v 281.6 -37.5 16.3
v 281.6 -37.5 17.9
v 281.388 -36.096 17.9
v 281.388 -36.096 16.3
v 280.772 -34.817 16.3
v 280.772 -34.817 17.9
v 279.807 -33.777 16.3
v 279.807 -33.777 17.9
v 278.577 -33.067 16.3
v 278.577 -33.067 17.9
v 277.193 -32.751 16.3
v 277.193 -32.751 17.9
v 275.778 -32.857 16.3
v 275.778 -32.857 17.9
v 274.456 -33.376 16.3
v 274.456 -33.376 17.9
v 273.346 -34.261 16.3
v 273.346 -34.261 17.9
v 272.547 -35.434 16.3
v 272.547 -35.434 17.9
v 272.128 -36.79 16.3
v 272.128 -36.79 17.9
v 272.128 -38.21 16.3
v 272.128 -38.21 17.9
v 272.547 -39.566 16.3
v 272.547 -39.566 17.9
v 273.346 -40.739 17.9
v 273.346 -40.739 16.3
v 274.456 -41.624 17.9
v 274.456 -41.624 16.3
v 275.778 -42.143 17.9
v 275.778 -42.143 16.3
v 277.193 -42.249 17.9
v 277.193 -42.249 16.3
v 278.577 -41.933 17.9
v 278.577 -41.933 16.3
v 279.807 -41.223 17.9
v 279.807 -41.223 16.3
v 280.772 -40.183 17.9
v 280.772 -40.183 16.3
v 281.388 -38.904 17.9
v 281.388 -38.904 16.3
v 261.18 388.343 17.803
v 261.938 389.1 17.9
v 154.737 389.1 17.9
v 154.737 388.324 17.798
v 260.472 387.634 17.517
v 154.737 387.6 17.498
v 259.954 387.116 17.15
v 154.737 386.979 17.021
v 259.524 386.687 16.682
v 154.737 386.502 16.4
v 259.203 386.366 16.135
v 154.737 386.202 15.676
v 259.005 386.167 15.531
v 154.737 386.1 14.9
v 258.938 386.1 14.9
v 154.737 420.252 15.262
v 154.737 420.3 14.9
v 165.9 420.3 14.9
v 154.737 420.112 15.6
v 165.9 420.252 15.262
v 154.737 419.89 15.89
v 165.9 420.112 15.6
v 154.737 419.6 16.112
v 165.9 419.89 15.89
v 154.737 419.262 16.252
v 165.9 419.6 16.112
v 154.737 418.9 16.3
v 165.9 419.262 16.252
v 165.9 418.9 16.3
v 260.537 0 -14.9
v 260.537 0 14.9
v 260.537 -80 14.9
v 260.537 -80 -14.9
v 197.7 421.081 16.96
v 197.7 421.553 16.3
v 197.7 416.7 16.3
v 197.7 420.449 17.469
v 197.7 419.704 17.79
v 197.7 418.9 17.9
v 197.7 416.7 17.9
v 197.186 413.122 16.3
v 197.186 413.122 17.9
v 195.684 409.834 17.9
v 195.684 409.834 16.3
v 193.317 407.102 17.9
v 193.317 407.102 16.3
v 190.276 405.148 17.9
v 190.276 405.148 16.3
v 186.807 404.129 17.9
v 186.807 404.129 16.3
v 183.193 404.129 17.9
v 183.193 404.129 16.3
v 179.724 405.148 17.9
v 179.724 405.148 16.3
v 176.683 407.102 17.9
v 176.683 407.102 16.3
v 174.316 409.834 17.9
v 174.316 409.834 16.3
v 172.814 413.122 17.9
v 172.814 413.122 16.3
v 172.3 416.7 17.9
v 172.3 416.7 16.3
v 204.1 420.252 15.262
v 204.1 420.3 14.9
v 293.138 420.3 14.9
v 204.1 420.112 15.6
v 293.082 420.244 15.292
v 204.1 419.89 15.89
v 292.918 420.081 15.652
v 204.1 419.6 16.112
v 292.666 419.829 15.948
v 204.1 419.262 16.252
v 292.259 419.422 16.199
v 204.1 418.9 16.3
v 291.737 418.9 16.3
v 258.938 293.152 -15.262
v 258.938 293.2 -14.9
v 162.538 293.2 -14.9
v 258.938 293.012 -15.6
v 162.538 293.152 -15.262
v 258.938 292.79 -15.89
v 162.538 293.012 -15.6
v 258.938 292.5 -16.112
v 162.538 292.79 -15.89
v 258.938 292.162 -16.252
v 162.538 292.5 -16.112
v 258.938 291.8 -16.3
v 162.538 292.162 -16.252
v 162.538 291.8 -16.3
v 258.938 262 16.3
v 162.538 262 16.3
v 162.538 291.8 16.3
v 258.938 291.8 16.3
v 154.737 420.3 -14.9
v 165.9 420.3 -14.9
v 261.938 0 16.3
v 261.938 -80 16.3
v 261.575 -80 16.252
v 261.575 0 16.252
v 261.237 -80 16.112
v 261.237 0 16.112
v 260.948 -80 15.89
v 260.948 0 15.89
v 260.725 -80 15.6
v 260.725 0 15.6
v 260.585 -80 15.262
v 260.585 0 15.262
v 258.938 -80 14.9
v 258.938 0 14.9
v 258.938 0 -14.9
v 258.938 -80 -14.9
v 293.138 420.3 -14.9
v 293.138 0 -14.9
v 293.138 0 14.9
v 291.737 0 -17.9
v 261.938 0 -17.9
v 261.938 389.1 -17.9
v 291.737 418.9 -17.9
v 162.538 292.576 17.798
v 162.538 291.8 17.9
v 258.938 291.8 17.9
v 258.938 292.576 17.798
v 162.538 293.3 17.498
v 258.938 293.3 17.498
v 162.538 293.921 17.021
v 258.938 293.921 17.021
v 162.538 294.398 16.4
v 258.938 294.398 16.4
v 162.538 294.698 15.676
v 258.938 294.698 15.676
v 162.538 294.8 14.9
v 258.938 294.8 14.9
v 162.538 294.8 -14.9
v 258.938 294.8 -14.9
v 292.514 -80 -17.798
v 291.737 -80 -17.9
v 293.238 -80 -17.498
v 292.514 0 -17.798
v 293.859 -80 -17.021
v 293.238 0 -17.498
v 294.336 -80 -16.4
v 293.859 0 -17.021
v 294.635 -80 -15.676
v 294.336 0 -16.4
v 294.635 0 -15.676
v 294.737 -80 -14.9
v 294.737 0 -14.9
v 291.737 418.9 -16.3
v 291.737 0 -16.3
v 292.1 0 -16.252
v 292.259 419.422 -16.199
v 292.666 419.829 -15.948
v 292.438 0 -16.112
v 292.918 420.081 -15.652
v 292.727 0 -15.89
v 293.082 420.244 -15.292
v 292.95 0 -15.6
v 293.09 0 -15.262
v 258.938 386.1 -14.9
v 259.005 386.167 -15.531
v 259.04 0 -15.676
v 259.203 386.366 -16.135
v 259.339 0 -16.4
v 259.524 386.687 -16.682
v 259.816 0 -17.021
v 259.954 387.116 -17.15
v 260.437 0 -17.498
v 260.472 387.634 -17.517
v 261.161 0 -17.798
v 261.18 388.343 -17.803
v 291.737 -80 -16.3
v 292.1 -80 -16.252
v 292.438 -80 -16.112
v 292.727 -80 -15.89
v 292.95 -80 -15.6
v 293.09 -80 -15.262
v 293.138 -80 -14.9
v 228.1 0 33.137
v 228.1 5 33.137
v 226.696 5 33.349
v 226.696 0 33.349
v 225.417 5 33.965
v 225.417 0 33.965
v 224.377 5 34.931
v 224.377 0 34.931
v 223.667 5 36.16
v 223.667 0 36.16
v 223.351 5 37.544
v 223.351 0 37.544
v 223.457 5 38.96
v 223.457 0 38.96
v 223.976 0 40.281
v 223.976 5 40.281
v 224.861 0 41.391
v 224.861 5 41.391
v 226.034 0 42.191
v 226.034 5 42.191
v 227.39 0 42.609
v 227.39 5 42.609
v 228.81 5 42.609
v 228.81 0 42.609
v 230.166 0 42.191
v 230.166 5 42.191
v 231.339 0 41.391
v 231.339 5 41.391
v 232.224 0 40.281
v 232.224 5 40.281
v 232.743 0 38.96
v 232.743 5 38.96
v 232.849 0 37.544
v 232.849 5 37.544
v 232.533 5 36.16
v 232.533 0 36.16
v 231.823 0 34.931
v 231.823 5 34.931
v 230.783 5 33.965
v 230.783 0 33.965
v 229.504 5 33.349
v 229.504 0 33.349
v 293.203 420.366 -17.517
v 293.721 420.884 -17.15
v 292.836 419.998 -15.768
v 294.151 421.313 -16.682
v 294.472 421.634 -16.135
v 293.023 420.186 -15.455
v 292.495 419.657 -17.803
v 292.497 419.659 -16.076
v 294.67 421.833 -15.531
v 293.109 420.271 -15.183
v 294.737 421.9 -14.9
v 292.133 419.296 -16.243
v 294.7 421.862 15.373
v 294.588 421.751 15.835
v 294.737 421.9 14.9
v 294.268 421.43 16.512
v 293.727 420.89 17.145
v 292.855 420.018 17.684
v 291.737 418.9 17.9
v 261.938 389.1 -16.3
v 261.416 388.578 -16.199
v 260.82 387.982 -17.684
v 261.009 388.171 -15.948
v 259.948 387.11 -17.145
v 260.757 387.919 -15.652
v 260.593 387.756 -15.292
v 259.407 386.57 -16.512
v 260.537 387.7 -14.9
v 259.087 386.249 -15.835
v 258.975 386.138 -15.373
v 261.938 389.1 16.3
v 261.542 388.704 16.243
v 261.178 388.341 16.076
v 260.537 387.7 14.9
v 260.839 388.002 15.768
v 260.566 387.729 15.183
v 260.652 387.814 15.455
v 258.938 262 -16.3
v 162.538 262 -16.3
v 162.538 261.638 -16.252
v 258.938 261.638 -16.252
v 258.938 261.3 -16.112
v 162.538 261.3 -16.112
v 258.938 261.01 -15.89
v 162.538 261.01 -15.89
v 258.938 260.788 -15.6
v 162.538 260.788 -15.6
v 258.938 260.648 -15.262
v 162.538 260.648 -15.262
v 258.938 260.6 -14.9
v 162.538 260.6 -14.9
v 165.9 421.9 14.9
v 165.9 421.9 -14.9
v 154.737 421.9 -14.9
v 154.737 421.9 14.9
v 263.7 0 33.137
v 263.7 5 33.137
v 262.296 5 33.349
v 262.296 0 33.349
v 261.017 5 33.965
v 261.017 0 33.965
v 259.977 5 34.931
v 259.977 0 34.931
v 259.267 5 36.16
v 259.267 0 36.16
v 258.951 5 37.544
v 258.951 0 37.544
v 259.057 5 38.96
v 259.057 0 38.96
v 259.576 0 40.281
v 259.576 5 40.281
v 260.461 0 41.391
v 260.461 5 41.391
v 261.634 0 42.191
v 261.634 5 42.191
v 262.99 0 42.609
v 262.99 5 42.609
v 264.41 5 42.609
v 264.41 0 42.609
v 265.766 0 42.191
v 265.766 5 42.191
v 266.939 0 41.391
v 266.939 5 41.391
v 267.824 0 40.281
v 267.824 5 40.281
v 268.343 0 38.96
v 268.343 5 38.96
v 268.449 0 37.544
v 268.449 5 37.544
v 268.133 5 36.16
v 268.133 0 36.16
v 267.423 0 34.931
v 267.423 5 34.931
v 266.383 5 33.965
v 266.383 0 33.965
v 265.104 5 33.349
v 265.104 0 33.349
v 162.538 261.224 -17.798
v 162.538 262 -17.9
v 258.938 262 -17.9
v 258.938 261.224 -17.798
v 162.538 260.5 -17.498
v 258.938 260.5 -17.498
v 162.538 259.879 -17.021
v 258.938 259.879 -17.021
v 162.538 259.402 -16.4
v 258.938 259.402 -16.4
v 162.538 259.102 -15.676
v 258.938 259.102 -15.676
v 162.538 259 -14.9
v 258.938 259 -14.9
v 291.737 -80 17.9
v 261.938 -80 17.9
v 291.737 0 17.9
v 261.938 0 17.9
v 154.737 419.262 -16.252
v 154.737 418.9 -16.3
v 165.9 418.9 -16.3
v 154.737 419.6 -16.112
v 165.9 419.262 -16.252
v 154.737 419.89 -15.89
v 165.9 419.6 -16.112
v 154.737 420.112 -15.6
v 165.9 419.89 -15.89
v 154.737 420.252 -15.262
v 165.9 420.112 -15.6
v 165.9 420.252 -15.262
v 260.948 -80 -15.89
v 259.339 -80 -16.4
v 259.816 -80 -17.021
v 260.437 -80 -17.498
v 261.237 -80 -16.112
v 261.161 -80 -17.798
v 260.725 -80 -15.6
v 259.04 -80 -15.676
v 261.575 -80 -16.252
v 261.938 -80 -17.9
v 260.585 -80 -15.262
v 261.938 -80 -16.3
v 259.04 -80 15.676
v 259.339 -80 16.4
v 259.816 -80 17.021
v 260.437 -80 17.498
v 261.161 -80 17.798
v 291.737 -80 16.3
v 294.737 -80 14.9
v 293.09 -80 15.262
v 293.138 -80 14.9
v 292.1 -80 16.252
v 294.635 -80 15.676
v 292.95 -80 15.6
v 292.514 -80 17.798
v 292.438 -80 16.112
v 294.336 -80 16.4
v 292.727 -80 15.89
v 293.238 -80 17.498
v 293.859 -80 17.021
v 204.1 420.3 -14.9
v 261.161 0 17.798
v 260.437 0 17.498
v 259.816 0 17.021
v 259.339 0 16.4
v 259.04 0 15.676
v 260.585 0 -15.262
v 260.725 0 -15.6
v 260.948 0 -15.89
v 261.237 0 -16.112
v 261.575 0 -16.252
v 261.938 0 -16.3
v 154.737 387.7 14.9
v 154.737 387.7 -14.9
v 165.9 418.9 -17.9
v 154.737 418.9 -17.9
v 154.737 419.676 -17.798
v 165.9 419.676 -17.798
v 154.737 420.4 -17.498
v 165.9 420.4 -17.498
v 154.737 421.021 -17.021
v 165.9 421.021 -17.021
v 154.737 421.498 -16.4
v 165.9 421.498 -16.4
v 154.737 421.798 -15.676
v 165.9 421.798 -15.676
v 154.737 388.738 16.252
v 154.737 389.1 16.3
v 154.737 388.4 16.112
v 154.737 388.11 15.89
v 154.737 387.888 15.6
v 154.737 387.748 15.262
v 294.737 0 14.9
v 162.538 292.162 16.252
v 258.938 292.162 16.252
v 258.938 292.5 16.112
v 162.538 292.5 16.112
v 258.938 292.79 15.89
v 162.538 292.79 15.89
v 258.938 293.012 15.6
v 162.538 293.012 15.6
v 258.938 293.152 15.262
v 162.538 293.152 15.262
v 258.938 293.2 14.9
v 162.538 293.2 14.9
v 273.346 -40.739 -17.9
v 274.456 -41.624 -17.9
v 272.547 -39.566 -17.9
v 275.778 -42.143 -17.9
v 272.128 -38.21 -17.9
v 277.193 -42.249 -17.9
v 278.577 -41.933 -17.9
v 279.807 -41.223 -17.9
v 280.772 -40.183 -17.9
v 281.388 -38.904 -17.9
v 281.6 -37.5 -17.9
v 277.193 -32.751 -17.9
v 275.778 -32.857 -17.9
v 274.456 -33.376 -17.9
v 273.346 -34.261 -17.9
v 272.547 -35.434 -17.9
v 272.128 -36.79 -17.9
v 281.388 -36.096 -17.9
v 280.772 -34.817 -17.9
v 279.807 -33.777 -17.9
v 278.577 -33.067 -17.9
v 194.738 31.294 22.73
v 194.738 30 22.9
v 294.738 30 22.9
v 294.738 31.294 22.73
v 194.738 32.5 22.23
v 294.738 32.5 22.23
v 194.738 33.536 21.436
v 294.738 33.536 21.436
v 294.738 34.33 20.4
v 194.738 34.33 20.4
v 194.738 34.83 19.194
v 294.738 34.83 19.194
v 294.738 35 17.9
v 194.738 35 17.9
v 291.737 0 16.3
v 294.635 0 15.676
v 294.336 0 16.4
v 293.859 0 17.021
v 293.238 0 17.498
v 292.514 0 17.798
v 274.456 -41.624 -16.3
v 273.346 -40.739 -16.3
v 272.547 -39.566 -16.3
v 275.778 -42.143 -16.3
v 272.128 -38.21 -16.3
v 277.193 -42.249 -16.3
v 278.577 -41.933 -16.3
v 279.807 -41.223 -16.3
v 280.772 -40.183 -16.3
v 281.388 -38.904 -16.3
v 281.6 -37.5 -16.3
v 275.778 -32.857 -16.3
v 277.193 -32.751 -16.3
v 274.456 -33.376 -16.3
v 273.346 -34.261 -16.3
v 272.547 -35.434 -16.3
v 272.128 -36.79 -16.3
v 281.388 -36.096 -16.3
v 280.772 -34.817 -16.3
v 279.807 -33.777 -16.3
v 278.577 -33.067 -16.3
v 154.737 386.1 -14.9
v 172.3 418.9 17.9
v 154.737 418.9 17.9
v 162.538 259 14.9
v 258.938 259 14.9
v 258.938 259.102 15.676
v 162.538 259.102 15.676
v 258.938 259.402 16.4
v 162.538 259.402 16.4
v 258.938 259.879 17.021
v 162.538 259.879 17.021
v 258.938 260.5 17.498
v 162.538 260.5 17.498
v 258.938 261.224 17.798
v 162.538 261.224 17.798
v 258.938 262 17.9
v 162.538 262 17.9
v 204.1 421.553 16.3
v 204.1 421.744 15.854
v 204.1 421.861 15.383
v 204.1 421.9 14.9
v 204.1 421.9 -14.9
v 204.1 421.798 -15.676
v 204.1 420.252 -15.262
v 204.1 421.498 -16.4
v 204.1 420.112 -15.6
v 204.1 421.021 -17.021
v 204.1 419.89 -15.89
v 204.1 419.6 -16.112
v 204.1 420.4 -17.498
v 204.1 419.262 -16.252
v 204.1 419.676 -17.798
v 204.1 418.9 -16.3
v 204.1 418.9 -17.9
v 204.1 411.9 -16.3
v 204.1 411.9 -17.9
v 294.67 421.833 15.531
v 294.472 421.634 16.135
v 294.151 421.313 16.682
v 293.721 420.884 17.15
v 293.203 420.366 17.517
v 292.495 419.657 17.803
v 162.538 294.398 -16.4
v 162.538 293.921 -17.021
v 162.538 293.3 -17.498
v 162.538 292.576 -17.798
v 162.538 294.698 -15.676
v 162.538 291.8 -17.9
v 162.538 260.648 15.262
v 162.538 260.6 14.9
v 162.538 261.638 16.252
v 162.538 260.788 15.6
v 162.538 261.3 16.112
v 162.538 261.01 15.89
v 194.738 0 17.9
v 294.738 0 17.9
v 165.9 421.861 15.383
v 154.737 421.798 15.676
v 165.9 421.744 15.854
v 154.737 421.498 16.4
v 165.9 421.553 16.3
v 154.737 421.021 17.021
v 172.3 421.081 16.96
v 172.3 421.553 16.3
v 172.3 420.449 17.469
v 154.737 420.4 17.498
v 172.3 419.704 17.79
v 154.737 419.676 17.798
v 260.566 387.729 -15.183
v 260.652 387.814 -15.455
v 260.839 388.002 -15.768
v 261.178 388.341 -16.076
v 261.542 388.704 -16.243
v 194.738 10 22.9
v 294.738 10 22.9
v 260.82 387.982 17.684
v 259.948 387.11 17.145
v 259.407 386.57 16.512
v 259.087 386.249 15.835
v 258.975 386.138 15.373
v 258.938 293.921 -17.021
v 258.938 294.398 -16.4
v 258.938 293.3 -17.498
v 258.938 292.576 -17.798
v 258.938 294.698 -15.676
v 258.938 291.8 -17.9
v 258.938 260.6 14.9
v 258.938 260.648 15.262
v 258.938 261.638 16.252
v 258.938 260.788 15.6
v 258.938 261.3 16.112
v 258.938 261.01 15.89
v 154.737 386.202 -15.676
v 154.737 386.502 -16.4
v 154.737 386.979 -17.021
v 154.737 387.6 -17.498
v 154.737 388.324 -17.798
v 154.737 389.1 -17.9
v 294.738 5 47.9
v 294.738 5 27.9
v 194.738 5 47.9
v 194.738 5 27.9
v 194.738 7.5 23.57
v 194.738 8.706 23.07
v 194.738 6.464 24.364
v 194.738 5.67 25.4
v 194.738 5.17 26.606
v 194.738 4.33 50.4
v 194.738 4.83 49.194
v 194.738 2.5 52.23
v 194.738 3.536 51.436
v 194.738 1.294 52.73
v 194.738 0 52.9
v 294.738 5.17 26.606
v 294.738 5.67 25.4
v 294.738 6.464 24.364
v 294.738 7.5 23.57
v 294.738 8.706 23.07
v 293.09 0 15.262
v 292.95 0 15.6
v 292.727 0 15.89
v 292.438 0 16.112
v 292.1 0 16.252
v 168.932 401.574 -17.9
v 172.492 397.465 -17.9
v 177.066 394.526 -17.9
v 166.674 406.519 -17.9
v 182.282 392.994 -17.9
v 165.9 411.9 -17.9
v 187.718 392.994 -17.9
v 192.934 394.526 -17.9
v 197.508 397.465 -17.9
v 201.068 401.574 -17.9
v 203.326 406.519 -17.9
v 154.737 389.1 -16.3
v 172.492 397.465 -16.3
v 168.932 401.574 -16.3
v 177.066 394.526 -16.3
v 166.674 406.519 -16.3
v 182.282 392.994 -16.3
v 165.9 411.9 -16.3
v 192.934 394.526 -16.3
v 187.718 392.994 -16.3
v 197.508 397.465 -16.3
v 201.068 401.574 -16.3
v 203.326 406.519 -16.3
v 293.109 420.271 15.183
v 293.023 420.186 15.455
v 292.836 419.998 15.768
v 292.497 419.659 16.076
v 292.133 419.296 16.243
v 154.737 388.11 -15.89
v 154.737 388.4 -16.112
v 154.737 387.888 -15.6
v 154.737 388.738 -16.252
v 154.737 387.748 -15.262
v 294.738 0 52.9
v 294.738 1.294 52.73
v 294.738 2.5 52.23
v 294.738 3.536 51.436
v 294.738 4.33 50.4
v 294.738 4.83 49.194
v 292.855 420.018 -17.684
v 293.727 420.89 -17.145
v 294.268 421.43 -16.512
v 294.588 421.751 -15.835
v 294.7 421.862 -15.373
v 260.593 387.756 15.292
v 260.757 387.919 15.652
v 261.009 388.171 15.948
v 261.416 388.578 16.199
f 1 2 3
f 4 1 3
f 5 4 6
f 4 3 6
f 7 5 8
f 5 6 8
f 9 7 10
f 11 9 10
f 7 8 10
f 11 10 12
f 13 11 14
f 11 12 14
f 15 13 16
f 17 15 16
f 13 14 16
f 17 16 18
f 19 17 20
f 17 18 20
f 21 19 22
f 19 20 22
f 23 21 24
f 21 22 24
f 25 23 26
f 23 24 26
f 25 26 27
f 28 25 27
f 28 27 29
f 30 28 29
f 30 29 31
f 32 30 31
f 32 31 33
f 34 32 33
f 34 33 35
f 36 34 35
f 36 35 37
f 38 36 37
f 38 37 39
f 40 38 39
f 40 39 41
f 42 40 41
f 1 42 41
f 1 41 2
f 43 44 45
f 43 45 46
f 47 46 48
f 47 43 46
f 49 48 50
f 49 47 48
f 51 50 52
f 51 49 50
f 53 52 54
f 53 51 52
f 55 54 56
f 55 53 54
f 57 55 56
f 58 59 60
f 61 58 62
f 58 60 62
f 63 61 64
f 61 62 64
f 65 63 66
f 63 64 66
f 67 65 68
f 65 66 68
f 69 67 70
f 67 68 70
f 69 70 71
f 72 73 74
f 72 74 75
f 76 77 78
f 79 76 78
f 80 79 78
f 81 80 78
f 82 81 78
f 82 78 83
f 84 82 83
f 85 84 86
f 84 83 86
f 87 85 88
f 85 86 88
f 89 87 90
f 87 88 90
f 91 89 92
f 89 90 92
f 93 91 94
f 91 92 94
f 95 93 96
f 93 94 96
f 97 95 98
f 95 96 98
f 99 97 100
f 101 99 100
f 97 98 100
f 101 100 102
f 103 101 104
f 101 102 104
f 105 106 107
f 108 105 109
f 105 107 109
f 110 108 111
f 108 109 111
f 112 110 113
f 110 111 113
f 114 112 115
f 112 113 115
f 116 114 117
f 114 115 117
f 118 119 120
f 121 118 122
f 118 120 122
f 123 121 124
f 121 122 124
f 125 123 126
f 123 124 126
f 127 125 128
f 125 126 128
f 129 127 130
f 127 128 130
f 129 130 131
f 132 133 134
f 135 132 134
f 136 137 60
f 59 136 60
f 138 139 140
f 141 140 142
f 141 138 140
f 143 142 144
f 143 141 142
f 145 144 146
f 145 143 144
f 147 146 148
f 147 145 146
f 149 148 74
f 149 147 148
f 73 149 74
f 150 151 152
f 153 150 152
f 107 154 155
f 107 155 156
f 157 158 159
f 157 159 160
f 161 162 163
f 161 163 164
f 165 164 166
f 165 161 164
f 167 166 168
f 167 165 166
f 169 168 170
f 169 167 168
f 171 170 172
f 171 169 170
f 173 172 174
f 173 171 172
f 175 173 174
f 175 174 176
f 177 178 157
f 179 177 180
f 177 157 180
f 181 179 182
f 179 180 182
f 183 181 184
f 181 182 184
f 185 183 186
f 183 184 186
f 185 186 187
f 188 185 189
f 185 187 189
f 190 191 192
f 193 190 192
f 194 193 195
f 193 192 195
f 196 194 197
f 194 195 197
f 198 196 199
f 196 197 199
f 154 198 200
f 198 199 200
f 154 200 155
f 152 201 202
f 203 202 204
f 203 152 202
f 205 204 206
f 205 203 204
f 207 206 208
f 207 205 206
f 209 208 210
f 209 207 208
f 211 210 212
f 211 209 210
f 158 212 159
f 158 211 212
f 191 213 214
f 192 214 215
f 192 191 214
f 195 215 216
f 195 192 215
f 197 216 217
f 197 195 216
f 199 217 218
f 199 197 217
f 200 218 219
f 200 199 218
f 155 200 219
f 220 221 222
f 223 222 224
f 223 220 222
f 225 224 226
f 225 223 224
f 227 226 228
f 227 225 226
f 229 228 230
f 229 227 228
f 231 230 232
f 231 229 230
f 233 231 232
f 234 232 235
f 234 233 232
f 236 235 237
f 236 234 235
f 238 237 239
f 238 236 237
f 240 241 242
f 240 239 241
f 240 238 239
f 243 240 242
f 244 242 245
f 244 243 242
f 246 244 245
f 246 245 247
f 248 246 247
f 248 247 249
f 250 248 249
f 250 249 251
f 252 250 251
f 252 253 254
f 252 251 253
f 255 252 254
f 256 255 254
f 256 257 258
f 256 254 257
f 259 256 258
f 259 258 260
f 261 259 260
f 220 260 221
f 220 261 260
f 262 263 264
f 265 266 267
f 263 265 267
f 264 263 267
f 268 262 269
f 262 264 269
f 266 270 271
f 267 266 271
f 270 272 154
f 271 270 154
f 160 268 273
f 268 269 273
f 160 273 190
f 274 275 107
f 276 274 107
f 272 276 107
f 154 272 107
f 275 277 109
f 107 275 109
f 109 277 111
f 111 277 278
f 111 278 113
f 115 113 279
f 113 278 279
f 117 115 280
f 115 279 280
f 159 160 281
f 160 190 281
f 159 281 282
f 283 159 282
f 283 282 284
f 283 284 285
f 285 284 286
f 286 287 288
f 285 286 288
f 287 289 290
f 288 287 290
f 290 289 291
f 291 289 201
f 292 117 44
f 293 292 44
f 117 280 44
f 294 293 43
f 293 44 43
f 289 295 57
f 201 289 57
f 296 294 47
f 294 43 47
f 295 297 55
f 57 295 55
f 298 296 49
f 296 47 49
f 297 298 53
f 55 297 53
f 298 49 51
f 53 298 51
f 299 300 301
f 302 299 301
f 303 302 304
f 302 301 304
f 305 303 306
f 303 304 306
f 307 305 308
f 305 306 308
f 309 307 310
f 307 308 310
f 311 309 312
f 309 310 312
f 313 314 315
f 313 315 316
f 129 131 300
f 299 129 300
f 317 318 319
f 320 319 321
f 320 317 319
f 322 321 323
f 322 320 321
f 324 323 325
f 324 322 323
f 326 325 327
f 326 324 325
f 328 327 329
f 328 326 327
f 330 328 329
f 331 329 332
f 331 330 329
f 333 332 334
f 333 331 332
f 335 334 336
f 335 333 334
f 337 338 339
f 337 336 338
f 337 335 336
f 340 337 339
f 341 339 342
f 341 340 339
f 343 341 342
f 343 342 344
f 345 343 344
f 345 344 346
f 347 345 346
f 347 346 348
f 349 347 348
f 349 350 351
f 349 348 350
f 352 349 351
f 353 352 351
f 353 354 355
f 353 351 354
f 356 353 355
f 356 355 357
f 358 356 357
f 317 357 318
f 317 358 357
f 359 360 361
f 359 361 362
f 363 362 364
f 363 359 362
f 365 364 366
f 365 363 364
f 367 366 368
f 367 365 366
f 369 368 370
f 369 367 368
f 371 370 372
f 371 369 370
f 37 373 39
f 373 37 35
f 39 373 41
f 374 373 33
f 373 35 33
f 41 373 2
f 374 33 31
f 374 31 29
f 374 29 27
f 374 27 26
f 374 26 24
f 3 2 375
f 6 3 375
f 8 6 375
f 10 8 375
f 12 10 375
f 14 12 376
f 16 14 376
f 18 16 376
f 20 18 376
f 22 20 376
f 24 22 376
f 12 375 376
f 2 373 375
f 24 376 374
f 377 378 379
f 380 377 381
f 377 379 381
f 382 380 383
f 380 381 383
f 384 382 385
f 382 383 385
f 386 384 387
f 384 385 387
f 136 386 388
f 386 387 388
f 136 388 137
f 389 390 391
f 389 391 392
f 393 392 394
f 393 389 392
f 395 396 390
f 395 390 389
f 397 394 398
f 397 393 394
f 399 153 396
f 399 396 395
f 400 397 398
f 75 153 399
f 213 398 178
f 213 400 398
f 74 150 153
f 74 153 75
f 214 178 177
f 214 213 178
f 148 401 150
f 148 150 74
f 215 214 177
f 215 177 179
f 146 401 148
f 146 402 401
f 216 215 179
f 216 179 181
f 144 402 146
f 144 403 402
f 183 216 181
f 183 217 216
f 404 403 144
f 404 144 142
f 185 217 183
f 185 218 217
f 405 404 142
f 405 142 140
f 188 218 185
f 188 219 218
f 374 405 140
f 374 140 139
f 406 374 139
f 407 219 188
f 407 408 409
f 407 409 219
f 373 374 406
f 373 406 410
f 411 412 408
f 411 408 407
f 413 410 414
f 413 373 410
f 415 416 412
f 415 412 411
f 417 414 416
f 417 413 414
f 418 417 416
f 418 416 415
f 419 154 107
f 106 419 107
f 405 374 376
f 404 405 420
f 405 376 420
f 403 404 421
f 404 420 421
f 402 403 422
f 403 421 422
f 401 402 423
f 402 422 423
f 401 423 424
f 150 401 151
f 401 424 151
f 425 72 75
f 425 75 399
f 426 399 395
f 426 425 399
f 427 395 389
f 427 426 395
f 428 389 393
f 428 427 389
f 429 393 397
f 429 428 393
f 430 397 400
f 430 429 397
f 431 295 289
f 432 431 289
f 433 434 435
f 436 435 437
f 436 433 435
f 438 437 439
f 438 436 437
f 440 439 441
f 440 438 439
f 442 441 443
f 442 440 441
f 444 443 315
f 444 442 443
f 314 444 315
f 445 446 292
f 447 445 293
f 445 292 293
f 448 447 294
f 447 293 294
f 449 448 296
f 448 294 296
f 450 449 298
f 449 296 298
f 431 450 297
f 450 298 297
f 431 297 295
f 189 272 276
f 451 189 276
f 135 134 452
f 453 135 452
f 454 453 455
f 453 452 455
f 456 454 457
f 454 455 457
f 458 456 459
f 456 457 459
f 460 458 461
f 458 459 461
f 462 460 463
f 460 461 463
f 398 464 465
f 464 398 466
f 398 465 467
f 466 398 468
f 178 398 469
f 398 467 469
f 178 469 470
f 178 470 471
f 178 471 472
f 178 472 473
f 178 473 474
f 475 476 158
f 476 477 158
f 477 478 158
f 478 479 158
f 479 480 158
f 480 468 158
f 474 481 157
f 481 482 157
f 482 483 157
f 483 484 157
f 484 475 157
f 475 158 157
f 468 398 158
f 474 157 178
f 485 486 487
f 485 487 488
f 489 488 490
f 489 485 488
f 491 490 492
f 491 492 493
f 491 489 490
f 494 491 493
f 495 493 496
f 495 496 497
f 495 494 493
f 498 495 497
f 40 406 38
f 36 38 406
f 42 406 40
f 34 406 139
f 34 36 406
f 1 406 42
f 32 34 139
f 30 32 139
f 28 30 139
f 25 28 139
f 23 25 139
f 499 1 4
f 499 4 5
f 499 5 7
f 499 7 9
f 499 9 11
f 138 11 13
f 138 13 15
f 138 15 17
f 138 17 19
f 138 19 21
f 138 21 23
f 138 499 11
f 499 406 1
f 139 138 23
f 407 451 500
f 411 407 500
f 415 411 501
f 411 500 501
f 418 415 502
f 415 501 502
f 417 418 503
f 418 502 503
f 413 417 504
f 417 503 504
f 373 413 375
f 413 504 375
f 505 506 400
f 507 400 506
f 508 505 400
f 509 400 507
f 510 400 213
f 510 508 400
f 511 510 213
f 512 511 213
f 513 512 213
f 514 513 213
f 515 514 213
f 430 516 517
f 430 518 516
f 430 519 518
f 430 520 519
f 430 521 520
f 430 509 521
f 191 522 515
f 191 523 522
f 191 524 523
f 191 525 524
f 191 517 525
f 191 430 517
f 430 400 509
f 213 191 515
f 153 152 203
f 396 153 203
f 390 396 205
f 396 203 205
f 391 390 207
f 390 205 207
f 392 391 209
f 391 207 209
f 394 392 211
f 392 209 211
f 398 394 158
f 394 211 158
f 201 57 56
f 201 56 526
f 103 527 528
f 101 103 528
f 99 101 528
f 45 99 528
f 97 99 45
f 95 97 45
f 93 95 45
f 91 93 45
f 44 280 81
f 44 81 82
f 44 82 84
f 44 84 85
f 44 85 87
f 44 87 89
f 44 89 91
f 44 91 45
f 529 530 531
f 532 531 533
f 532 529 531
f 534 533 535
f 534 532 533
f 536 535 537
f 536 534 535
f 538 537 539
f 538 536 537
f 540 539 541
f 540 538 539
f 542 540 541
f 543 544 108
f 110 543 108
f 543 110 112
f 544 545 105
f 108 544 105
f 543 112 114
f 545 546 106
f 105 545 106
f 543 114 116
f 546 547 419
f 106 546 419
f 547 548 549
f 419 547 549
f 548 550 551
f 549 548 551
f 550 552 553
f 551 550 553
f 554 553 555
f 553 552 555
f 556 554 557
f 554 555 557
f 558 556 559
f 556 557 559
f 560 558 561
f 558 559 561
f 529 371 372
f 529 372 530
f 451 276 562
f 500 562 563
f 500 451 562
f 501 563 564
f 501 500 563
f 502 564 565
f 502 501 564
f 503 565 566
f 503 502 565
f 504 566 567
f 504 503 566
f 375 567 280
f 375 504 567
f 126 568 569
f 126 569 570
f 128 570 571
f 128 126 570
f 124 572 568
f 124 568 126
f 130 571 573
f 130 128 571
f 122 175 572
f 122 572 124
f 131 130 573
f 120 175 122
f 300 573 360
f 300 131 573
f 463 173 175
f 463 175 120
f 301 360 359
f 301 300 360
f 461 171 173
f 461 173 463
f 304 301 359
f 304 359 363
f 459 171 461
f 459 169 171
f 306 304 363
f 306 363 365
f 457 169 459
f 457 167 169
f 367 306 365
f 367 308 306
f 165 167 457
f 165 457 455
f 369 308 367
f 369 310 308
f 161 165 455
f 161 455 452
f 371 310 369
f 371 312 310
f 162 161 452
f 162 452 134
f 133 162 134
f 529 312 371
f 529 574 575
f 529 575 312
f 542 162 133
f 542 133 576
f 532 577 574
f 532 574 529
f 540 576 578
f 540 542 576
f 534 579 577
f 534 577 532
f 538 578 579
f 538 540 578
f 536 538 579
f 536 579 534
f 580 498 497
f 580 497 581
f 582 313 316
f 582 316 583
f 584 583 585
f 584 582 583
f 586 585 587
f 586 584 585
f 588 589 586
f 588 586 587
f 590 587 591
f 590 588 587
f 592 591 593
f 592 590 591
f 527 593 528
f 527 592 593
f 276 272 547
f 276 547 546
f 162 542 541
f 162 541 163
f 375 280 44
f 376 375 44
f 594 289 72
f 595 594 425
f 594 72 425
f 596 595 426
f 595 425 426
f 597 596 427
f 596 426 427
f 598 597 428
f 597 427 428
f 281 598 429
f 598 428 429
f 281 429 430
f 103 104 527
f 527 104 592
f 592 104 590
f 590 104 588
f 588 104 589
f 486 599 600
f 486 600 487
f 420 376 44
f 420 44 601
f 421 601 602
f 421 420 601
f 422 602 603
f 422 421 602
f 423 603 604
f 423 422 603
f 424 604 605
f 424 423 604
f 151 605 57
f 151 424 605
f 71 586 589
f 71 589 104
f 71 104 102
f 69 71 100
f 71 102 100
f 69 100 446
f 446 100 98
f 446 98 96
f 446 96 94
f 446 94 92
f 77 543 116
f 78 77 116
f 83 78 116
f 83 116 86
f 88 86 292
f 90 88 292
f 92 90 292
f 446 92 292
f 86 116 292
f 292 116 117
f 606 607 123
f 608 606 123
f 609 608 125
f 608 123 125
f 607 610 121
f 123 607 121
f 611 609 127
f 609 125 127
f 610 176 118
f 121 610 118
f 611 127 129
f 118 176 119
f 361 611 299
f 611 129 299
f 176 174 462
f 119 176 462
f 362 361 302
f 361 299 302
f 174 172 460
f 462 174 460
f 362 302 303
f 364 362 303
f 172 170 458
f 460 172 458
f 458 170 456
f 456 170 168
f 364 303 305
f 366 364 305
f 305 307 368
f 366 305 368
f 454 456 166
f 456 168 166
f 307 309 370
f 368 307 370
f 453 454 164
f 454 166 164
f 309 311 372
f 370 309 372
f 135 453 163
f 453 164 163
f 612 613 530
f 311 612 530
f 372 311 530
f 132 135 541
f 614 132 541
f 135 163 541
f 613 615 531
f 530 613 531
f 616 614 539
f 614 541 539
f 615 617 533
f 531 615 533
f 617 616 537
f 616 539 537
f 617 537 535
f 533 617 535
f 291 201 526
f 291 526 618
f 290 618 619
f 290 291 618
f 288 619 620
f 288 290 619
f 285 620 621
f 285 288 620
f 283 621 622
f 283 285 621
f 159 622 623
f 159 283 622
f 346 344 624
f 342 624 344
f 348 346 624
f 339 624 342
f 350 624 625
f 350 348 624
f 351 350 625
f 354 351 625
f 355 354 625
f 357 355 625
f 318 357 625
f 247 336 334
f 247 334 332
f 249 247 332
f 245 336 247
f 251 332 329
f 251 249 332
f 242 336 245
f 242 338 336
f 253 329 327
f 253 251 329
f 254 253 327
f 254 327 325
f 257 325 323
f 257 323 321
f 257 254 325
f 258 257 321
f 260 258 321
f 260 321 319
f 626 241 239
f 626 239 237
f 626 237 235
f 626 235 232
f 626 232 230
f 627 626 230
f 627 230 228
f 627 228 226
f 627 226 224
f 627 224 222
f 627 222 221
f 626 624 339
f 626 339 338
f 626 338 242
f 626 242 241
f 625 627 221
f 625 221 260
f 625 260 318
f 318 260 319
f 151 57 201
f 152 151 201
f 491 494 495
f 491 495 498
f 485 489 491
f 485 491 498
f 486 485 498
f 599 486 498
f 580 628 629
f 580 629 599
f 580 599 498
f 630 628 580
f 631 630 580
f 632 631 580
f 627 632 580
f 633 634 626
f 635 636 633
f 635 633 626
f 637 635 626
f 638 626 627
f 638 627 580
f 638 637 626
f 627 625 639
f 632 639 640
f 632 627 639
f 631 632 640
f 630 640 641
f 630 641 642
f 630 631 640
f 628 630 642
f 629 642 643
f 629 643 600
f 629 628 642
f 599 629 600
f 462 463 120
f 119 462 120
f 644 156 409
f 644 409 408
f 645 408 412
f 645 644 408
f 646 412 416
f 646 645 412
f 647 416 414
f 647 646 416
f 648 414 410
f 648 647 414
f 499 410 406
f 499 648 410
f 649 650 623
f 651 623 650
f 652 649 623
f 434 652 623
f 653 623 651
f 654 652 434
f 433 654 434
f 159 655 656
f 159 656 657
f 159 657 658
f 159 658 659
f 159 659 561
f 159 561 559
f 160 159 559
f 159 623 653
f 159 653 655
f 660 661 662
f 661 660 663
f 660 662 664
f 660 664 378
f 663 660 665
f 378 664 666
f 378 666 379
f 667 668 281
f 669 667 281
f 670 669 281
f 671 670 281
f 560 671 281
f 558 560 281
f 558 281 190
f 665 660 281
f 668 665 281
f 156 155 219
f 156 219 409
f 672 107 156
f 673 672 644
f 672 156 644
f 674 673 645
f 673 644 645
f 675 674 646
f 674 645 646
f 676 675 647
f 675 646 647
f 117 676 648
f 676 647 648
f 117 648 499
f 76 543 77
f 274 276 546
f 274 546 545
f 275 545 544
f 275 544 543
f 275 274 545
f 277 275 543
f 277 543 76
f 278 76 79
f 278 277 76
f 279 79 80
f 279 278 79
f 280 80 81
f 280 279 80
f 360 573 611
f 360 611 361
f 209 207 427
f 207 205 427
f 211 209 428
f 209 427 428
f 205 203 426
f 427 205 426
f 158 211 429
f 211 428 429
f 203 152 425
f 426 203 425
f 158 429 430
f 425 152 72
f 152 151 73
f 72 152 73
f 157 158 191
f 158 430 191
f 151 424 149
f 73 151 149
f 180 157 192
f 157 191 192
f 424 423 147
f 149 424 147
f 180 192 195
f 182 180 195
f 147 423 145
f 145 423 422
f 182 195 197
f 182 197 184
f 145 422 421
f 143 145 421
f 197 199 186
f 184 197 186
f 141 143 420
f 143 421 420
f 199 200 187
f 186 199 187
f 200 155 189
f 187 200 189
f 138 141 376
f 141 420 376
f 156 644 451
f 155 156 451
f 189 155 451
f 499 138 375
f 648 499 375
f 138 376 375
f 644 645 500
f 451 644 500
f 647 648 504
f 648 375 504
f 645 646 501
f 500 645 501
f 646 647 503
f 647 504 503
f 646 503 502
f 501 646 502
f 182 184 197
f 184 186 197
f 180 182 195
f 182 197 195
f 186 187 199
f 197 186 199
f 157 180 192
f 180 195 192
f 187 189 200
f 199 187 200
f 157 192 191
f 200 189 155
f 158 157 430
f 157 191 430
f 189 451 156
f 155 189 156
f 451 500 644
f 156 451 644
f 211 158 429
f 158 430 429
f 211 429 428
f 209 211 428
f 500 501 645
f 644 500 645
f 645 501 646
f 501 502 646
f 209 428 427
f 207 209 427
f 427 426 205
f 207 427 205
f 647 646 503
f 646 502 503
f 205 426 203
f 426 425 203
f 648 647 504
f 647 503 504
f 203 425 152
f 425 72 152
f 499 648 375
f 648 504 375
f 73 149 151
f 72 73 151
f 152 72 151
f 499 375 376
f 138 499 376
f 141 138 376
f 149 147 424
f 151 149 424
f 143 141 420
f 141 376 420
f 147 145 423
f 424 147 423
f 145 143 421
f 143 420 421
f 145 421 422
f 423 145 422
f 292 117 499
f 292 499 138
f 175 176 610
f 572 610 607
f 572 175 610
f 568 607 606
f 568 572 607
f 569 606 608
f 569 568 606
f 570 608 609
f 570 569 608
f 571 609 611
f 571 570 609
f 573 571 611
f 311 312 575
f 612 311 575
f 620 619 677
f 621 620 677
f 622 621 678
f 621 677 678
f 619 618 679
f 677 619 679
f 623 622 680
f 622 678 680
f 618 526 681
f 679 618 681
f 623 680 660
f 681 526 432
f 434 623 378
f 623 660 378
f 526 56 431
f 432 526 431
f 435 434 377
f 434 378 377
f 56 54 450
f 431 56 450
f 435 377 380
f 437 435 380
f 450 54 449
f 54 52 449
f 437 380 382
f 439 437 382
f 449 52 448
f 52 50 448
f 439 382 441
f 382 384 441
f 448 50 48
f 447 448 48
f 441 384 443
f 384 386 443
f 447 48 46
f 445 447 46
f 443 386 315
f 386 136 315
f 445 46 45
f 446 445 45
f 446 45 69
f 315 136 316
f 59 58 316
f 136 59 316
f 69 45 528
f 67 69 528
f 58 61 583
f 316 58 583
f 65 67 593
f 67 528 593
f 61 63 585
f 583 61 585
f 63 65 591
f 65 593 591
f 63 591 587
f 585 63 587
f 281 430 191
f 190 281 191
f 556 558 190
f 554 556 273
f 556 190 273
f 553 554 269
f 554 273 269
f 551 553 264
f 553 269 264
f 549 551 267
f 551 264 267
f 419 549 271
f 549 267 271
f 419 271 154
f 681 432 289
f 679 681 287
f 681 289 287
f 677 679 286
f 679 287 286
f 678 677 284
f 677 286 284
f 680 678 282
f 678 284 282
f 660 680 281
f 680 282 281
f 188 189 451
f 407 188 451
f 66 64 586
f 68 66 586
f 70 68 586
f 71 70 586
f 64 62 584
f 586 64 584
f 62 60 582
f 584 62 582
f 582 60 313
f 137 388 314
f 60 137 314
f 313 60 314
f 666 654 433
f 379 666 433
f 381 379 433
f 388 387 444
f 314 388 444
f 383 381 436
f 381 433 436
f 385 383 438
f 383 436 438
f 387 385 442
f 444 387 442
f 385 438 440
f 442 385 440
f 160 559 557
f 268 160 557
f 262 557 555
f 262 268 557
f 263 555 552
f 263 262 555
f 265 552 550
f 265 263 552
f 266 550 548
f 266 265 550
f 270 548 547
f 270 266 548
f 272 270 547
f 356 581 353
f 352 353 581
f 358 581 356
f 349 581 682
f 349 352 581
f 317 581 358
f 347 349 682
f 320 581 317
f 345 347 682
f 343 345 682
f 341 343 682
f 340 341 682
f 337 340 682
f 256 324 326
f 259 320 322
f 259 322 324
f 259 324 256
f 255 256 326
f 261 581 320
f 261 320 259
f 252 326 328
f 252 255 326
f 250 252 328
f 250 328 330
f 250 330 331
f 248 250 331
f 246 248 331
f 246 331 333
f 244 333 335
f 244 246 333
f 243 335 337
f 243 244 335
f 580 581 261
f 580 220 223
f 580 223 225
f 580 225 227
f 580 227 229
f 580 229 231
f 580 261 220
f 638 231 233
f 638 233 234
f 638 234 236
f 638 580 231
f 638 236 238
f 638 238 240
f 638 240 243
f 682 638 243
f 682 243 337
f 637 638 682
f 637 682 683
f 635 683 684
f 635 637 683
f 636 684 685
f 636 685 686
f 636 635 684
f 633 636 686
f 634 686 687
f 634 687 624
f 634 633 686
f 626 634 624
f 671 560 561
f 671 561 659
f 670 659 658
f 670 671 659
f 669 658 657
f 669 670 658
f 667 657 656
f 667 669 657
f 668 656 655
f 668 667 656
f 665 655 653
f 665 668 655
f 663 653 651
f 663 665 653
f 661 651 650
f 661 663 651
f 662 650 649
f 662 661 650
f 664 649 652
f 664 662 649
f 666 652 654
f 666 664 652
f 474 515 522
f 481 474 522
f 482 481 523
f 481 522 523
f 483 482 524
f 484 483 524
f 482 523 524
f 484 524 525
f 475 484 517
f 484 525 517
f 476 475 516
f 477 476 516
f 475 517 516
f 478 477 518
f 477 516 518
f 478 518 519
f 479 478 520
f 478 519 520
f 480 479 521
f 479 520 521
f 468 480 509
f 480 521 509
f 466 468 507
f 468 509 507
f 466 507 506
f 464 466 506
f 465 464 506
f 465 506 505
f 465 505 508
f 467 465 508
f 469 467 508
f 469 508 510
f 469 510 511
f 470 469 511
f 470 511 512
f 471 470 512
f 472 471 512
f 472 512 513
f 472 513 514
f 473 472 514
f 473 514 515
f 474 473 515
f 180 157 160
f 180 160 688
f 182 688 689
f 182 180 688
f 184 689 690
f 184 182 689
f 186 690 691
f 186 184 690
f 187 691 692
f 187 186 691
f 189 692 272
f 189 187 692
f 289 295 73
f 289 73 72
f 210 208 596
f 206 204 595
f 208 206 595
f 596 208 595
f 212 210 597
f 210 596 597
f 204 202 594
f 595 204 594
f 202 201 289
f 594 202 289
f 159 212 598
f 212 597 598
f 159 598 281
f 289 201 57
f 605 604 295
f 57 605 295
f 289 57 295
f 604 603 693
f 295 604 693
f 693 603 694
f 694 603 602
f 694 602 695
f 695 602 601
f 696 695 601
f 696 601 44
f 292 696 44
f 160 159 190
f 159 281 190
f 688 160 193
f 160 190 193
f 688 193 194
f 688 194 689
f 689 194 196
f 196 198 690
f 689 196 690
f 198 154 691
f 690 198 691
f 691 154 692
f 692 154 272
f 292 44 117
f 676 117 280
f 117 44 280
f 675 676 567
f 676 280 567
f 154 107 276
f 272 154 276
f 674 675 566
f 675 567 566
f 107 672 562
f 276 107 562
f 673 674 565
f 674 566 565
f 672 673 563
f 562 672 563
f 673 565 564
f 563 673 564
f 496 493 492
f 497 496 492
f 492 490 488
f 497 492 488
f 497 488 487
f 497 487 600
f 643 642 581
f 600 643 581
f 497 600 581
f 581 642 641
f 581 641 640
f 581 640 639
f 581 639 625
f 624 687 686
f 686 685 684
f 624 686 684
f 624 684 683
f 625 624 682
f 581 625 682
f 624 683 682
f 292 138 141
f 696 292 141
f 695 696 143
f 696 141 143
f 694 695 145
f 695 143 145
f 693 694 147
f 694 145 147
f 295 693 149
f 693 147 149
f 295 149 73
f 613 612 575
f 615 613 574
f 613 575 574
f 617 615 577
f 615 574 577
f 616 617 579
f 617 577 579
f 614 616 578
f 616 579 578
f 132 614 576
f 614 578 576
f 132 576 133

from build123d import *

# Parameters (mm, degrees)
STRUCTURAL_MEMBERMAIN_DEPTH                   = 1
STRUCTURAL_MEMBERMAIN_DEPTH_BACK              = 80
STRUCTURAL_MEMBERMAIN_2_DEPTH                 = 431.314422766
STRUCTURAL_MEMBERMAIN_3_DEPTH                 = 148.414422766
STRUCTURAL_MEMBERMAIN_4_DEPTH                 = 115.3
CUT_EXTRUDETOPRAILGUIDE_DEPTH                 = 515.966225986
CUT_EXTRUDETOPRAILGUIDE_DEPTH_BACK            = 515.966225986
STRUCTURAL_MEMBERANGLE_DEPTH                  = 100
SKETCH15_R                                    = 4.7625
CUT_EXTRUDEMOUNTINGHOLES_DEPTH                = 518.366614603
CUT_EXTRUDEENLARGERAILGUIDE_DEPTH             = 518.366614603
CUT_EXTRUDEENLARGERAILGUIDE_DIRECTION_2_REACH = 519.367
SKETCH17_R                                    = 4.7625
CUT_EXTRUDE1_DEPTH                            = 516.898676007


with BuildPart() as part:
    # Sketch11 → Structural MemberMain (new, two sides)
    with BuildSketch(Plane(origin=(276.8375, 0, 0), x_dir=(-1, 0, 0), z_dir=(0, 1, 0))) as structural_membermain_sk:
        with BuildLine():
            Line((-14.9, 17.9), (14.9, 17.9))
            ThreePointArc((14.9, 17.9), (17.021320344, 17.021320344), (17.9, 14.9))
            Line((17.9, 14.9), (17.9, -14.9))
            ThreePointArc((17.9, -14.9), (17.021320344, -17.021320344), (14.9, -17.9))
            Line((14.9, -17.9), (-14.9, -17.9))
            ThreePointArc((-14.9, -17.9), (-17.021320344, -17.021320344), (-17.9, -14.9))
            Line((-17.9, -14.9), (-17.9, 14.9))
            ThreePointArc((-17.9, 14.9), (-17.021320344, 17.021320344), (-14.9, 17.9))
        make_face()
        with BuildLine():
            Line((-14.9, 16.3), (14.9, 16.3))
            ThreePointArc((14.9, 16.3), (15.889949494, 15.889949494), (16.3, 14.9))
            Line((16.3, 14.9), (16.3, -14.9))
            ThreePointArc((16.3, -14.9), (15.889949494, -15.889949494), (14.9, -16.3))
            Line((14.9, -16.3), (-14.9, -16.3))
            ThreePointArc((-14.9, -16.3), (-15.889949494, -15.889949494), (-16.3, -14.9))
            Line((-16.3, -14.9), (-16.3, 14.9))
            ThreePointArc((-16.3, 14.9), (-15.889949494, 15.889949494), (-14.9, 16.3))
        make_face(mode=Mode.SUBTRACT)
    extrude(amount=STRUCTURAL_MEMBERMAIN_DEPTH)
    extrude(structural_membermain_sk.sketch, amount=-STRUCTURAL_MEMBERMAIN_DEPTH_BACK)

    # Structural MemberMain mitre 1
    split(bisect_by=Plane(origin=(276.8375, 0, 0), x_dir=(1, 0, 0), z_dir=(0, -1, 0)), keep=Keep.TOP)

    # Sketch17 → Cut-Extrude1 (cut, through all)
    with BuildSketch(Plane.XY.offset(17.9)):
        with Locations((276.8375, -37.5)):
            Circle(SKETCH17_R)
    extrude(amount=-CUT_EXTRUDE1_DEPTH, mode=Mode.SUBTRACT)


with BuildPart() as body_2:
    # Sketch11 on segment 2 (carried to segment 2) → Structural MemberMain 2 (new body)
    with BuildSketch(Plane(origin=(276.8375, -1, 0), x_dir=(-1, 0, 0), z_dir=(0, 1, 0))):
        with BuildLine():
            Line((-14.9, 17.9), (14.9, 17.9))
            ThreePointArc((14.9, 17.9), (17.021320344, 17.021320344), (17.9, 14.9))
            Line((17.9, 14.9), (17.9, -14.9))
            ThreePointArc((17.9, -14.9), (17.021320344, -17.021320344), (14.9, -17.9))
            Line((14.9, -17.9), (-14.9, -17.9))
            ThreePointArc((-14.9, -17.9), (-17.021320344, -17.021320344), (-17.9, -14.9))
            Line((-17.9, -14.9), (-17.9, 14.9))
            ThreePointArc((-17.9, 14.9), (-17.021320344, 17.021320344), (-14.9, 17.9))
        make_face()
        with BuildLine():
            Line((-14.9, 16.3), (14.9, 16.3))
            ThreePointArc((14.9, 16.3), (15.889949494, 15.889949494), (16.3, 14.9))
            Line((16.3, 14.9), (16.3, -14.9))
            ThreePointArc((16.3, -14.9), (15.889949494, -15.889949494), (14.9, -16.3))
            Line((14.9, -16.3), (-14.9, -16.3))
            ThreePointArc((-14.9, -16.3), (-15.889949494, -15.889949494), (-16.3, -14.9))
            Line((-16.3, -14.9), (-16.3, 14.9))
            ThreePointArc((-16.3, 14.9), (-15.889949494, 15.889949494), (-14.9, 16.3))
        make_face(mode=Mode.SUBTRACT)
    extrude(amount=STRUCTURAL_MEMBERMAIN_2_DEPTH)

    # Structural MemberMain 2 mitre 1
    split(bisect_by=Plane(origin=(276.8375, 0, 0), x_dir=(-1, 0, 0), z_dir=(0, 1, 0)), keep=Keep.TOP)

    # Structural MemberMain 2 mitre 2
    split(bisect_by=Plane(origin=(276.8375, 404, 0), x_dir=(0.707106781, 0.707106781, 0), z_dir=(0.707106781, -0.707106781, 0)), keep=Keep.TOP)


with BuildPart() as body_3:
    # Sketch11 on segment 3 (carried to segment 3) → Structural MemberMain 3 (new body)
    with BuildSketch(Plane(origin=(303.151922766, 404, 0), x_dir=(0, -1, 0), z_dir=(-1, 0, 0))):
        with BuildLine():
            Line((-14.9, 17.9), (14.9, 17.9))
            ThreePointArc((14.9, 17.9), (17.021320344, 17.021320344), (17.9, 14.9))
            Line((17.9, 14.9), (17.9, -14.9))
            ThreePointArc((17.9, -14.9), (17.021320344, -17.021320344), (14.9, -17.9))
            Line((14.9, -17.9), (-14.9, -17.9))
            ThreePointArc((-14.9, -17.9), (-17.021320344, -17.021320344), (-17.9, -14.9))
            Line((-17.9, -14.9), (-17.9, 14.9))
            ThreePointArc((-17.9, 14.9), (-17.021320344, 17.021320344), (-14.9, 17.9))
        make_face()
        with BuildLine():
            Line((-14.9, 16.3), (14.9, 16.3))
            ThreePointArc((14.9, 16.3), (15.889949494, 15.889949494), (16.3, 14.9))
            Line((16.3, 14.9), (16.3, -14.9))
            ThreePointArc((16.3, -14.9), (15.889949494, -15.889949494), (14.9, -16.3))
            Line((14.9, -16.3), (-14.9, -16.3))
            ThreePointArc((-14.9, -16.3), (-15.889949494, -15.889949494), (-16.3, -14.9))
            Line((-16.3, -14.9), (-16.3, 14.9))
            ThreePointArc((-16.3, 14.9), (-15.889949494, 15.889949494), (-14.9, 16.3))
        make_face(mode=Mode.SUBTRACT)
    extrude(amount=STRUCTURAL_MEMBERMAIN_3_DEPTH)

    # Structural MemberMain 3 mitre 1
    split(bisect_by=Plane(origin=(276.8375, 404, 0), x_dir=(-0.707106781, -0.707106781, 0), z_dir=(-0.707106781, 0.707106781, 0)), keep=Keep.TOP)

    # Sketch12 → Cut-ExtrudeTopRailGuide (cut, two sides)
    with BuildSketch(Plane.XY) as cut_extrudetoprailguide_sk:
        with BuildLine():
            Line((172.3, 416.7), (172.3, 427.1))
            ThreePointArc((172.3, 427.1), (185, 439.8), (197.7, 427.1))
            Line((197.7, 427.1), (197.7, 416.7))
            ThreePointArc((197.7, 416.7), (185, 404), (172.3, 416.7))
        make_face()
    extrude(amount=CUT_EXTRUDETOPRAILGUIDE_DEPTH, mode=Mode.SUBTRACT)
    extrude(cut_extrudetoprailguide_sk.sketch, amount=-CUT_EXTRUDETOPRAILGUIDE_DEPTH_BACK, mode=Mode.SUBTRACT)

    # Sketch16 → Cut-ExtrudeEnlargeRailGuide (cut)
    with BuildSketch(Plane.XY):
        with BuildLine():
            Line((204.1, 431.9), (204.1, 411.9))
            ThreePointArc((204.1, 411.9), (185, 392.8), (165.9, 411.9))
            Line((165.9, 411.9), (165.9, 431.9))
            ThreePointArc((165.9, 431.9), (185, 451), (204.1, 431.9))
        make_face()
    extrude(amount=-CUT_EXTRUDEENLARGERAILGUIDE_DEPTH, mode=Mode.SUBTRACT)

    # Cut-ExtrudeEnlargeRailGuide direction 2: up to this face of the body (flat: up to its plane)
    cut_extrudeenlargerailguide_direction_2_end = Plane(body_3.part.faces().sort_by_distance((218.978271579, 403.874495333, 16.3))[0])
    # Sketch16 → Cut-ExtrudeEnlargeRailGuide direction 2 (cut, up to the picked face)
    with BuildSketch(Plane.XY, mode=Mode.PRIVATE) as cut_extrudeenlargerailguide_direction_2_sk1:
        with BuildLine():
            Line((204.1, 431.9), (204.1, 411.9))
            ThreePointArc((204.1, 411.9), (185, 392.8), (165.9, 411.9))
            Line((165.9, 411.9), (165.9, 431.9))
            ThreePointArc((165.9, 431.9), (185, 451), (204.1, 431.9))
        make_face()
    cut_extrudeenlargerailguide_direction_2_tool1 = split(extrude(cut_extrudeenlargerailguide_direction_2_sk1.sketch, amount=CUT_EXTRUDEENLARGERAILGUIDE_DIRECTION_2_REACH, mode=Mode.PRIVATE), bisect_by=cut_extrudeenlargerailguide_direction_2_end, keep=Keep.BOTH, mode=Mode.PRIVATE)
    add(cut_extrudeenlargerailguide_direction_2_tool1.solids().sort_by(Axis((185, 421.9, 0), (0, 0, 1)))[0], mode=Mode.SUBTRACT)


with BuildPart() as body_4:
    # Sketch11 on segment 4 (carried to segment 4) → Structural MemberMain 4 (new body)
    with BuildSketch(Plane(origin=(162.5375, 276.9, 0), x_dir=(0, 1, 0), z_dir=(1, 0, 0))):
        with BuildLine():
            Line((-14.9, 17.9), (14.9, 17.9))
            ThreePointArc((14.9, 17.9), (17.021320344, 17.021320344), (17.9, 14.9))
            Line((17.9, 14.9), (17.9, -14.9))
            ThreePointArc((17.9, -14.9), (17.021320344, -17.021320344), (14.9, -17.9))
            Line((14.9, -17.9), (-14.9, -17.9))
            ThreePointArc((-14.9, -17.9), (-17.021320344, -17.021320344), (-17.9, -14.9))
            Line((-17.9, -14.9), (-17.9, 14.9))
            ThreePointArc((-17.9, 14.9), (-17.021320344, 17.021320344), (-14.9, 17.9))
        make_face()
        with BuildLine():
            Line((-14.9, 16.3), (14.9, 16.3))
            ThreePointArc((14.9, 16.3), (15.889949494, 15.889949494), (16.3, 14.9))
            Line((16.3, 14.9), (16.3, -14.9))
            ThreePointArc((16.3, -14.9), (15.889949494, -15.889949494), (14.9, -16.3))
            Line((14.9, -16.3), (-14.9, -16.3))
            ThreePointArc((-14.9, -16.3), (-15.889949494, -15.889949494), (-16.3, -14.9))
            Line((-16.3, -14.9), (-16.3, 14.9))
            ThreePointArc((-16.3, 14.9), (-15.889949494, 15.889949494), (-14.9, 16.3))
        make_face(mode=Mode.SUBTRACT)
    extrude(amount=STRUCTURAL_MEMBERMAIN_4_DEPTH)

    # Structural MemberMain 4 mitre 1
    split(bisect_by=Plane(origin=(258.9375, 276.9, 0), x_dir=(0, -1, 0), z_dir=(-1, 0, 0)), keep=Keep.TOP)


with BuildPart() as body_5:
    # Sketch14 → Structural MemberAngle (new body)
    with BuildSketch(Plane(origin=(194.7375, 0, 17.9), x_dir=(0, 1, 0), z_dir=(1, 0, 0))):
        with BuildLine():
            Line((0, 0), (0, 35))
            ThreePointArc((0, 35), (3.535533906, 33.535533906), (5, 30))
            Line((5, 30), (5, 10))
            ThreePointArc((5, 10), (6.464466094, 6.464466094), (10, 5))
            Line((10, 5), (30, 5))
            ThreePointArc((30, 5), (33.535533906, 3.535533906), (35, 0))
            Line((35, 0), (0, 0))
        make_face()
    extrude(amount=STRUCTURAL_MEMBERANGLE_DEPTH)

    # Sketch15 → Cut-ExtrudeMountingHoles (cut, through all)
    with BuildSketch(Plane(origin=(0, 0, 0), x_dir=(1, 0, 0), z_dir=(0, 1, 0))):
        with Locations(Location((228.1, -37.9, 0), (0, 0, 90))):
            Circle(SKETCH15_R)
        with Locations(Location((263.7, -37.9, 0), (0, 0, 90))):
            Circle(SKETCH15_R)
    extrude(amount=CUT_EXTRUDEMOUNTINGHOLES_DEPTH, mode=Mode.SUBTRACT)


solid = Compound([part.part, body_2.part, body_3.part, body_4.part, body_5.part])
